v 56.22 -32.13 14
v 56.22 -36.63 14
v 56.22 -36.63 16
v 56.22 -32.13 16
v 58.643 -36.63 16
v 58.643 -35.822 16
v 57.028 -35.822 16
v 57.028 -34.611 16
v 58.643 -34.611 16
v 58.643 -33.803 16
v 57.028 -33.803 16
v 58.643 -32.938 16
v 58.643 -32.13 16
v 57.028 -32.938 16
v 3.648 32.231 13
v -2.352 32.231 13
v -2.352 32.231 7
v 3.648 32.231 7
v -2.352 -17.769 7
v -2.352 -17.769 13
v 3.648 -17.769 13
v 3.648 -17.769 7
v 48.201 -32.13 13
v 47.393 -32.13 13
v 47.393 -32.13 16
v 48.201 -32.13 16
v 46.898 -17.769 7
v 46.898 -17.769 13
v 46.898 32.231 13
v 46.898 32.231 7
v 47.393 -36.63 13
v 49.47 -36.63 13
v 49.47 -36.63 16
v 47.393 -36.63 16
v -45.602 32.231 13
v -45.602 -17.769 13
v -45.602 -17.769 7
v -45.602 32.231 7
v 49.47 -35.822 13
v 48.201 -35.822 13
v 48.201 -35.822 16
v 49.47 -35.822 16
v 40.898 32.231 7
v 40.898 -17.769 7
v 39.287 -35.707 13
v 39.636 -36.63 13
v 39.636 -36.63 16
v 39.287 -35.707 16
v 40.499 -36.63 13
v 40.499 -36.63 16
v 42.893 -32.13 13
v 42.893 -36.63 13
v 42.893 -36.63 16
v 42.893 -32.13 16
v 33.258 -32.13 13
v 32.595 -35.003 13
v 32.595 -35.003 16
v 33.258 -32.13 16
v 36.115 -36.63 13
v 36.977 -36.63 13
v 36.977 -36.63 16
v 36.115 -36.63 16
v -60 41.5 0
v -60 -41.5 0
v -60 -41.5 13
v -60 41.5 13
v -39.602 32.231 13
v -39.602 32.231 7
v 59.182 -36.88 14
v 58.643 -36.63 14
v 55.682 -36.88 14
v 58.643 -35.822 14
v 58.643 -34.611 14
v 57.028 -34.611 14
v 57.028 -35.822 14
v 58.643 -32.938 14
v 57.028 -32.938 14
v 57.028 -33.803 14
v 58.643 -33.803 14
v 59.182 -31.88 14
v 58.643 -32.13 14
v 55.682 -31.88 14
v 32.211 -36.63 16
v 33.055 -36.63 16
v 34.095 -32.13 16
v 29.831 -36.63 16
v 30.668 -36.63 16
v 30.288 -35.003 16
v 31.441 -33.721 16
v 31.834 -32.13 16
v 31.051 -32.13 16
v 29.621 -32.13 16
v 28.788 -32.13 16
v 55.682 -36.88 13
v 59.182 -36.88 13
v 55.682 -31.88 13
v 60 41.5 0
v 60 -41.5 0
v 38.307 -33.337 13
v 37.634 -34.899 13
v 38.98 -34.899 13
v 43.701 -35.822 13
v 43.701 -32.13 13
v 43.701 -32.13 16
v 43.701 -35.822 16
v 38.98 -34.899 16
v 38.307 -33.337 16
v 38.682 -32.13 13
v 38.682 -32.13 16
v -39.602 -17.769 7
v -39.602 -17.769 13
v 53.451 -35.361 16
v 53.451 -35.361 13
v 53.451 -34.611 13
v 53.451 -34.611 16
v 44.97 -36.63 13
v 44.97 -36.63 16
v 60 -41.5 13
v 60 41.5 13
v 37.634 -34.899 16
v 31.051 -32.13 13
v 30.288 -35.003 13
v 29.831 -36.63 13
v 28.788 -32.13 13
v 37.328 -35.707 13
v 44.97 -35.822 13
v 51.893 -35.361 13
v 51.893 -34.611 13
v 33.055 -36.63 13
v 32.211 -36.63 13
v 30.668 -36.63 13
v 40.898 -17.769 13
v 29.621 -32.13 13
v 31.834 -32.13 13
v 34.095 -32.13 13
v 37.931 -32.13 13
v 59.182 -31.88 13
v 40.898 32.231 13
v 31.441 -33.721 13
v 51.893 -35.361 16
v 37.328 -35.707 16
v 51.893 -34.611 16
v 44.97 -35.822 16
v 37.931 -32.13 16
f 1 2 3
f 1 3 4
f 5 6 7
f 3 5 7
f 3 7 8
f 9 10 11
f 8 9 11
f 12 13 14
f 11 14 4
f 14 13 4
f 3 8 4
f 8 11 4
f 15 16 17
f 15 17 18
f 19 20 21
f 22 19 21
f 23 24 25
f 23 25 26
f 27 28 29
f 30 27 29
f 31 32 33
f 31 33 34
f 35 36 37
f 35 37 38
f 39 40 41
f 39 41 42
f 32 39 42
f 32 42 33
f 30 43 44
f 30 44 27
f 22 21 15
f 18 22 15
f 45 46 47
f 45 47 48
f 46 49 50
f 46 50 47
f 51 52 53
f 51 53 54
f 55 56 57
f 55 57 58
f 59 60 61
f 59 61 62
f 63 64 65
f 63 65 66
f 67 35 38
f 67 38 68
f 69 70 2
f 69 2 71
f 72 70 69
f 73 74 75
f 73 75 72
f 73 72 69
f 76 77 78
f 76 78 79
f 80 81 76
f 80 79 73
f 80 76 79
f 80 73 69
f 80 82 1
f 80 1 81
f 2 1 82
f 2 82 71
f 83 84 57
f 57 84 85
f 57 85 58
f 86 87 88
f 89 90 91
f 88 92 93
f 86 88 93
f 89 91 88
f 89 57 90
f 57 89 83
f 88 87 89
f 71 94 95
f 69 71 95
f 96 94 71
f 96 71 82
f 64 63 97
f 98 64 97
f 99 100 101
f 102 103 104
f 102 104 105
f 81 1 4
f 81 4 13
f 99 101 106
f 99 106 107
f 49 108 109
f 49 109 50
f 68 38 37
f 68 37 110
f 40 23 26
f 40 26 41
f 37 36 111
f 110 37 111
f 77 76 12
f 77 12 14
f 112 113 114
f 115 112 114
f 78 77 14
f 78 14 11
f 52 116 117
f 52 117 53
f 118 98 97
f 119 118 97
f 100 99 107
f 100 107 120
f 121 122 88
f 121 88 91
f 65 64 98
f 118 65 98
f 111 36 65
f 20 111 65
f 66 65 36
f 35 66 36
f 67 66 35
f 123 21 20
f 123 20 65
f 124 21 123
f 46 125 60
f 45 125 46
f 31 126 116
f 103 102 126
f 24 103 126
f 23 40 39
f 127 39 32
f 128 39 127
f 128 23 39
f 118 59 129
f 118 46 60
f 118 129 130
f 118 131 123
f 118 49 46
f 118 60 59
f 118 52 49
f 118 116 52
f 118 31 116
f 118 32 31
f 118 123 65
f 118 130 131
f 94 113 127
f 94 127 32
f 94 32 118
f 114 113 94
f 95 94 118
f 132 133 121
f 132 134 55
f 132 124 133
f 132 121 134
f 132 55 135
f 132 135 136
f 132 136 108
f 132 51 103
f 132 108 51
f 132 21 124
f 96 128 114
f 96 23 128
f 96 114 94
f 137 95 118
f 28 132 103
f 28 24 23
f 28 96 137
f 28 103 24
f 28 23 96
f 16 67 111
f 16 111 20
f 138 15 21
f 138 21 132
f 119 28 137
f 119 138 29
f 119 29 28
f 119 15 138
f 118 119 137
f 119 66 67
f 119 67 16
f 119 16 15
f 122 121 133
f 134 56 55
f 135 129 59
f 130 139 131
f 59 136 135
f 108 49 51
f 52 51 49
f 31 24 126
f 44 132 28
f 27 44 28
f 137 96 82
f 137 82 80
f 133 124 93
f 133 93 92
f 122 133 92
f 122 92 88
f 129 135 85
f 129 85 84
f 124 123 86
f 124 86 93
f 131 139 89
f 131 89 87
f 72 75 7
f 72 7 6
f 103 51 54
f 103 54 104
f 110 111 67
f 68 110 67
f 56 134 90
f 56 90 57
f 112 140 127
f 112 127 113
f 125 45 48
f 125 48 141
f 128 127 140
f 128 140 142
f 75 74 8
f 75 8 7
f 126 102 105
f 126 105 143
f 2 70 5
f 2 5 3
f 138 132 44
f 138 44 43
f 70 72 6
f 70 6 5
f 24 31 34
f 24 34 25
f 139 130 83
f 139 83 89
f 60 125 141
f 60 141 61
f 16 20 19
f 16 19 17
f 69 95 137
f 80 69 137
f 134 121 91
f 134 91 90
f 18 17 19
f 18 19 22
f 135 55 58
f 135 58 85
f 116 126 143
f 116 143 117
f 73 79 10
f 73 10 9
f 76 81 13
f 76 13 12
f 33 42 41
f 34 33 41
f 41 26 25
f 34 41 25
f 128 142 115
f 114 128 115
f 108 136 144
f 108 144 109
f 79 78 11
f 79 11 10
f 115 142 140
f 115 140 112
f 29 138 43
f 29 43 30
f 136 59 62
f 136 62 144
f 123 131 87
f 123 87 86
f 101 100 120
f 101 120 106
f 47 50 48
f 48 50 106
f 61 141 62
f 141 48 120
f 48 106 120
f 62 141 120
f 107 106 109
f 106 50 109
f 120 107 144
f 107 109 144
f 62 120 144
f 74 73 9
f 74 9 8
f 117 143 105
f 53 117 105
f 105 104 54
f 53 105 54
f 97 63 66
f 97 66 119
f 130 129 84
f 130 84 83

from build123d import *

# Parameters (mm, degrees)
SKETCH1_W           = 120
SKETCH1_H           = 83
BOSS_EXTRUDE1_DEPTH = 13
SKETCH2_W           = 6
SKETCH2_H           = 50
CUT_EXTRUDE1_DEPTH  = 6
SKETCH4_W           = 1.557692307
SKETCH4_H           = 0.75
BOSS_EXTRUDE3_DEPTH = 3
SKETCH5_W           = 3.5
SKETCH5_H           = 5
BOSS_EXTRUDE4_DEPTH = 1


with BuildPart() as part:
    # Sketch1 → Boss-Extrude1 (new body)
    with BuildSketch(Plane.XY):
        Rectangle(SKETCH1_W, SKETCH1_H)
    extrude(amount=BOSS_EXTRUDE1_DEPTH)

    # Sketch2 → Cut-Extrude1 (cut)
    with BuildSketch(Plane.XY.offset(13)):
        with Locations((-42.602242675, 7.231357776)):
            Rectangle(SKETCH2_W, SKETCH2_H)
        with Locations((0.647757325, 7.231357776)):
            Rectangle(SKETCH2_W, SKETCH2_H)
        with Locations((43.897757325, 7.231357776)):
            Rectangle(SKETCH2_W, SKETCH2_H)
    extrude(amount=-CUT_EXTRUDE1_DEPTH, mode=Mode.SUBTRACT)

    # Sketch4 → Boss-Extrude3 (add)
    # profile 1 of 6: a face of its own
    with BuildSketch(Plane.XY.offset(13)):
        Polygon((28.787603371, -32.130057538), (29.621437506, -32.130057538), (30.287603371, -35.002954173), (31.051125006, -32.130057538), (31.834478371, -32.130057538), (32.595295679, -35.002954173), (33.257855775, -32.130057538), (34.095295679, -32.130057538), (33.055031256, -36.630057538), (32.211281256, -36.630057538), (31.441449525, -33.721103211), (30.668012025, -36.630057538), (29.830572121, -36.630057538), align=None)
    # profile 2 of 6: a face of its own
    with BuildSketch(Plane.XY.offset(13)):
        Polygon((37.930932698, -32.130057538), (38.68183414, -32.130057538), (40.499141833, -36.630057538), (39.636461544, -36.630057538), (39.286701929, -35.706980615), (37.327867794, -35.706980615), (36.977206736, -36.630057538), (36.114526448, -36.630057538), align=None)
        Polygon((38.30683414, -33.337088788), (37.634358179, -34.899288307), (38.980211544, -34.899288307), align=None, mode=Mode.SUBTRACT)
    # profile 3 of 6: a face of its own
    with BuildSketch(Plane.XY.offset(13)):
        Polygon((42.893372602, -32.130057538), (43.701064909, -32.130057538), (43.701064909, -35.82236523), (44.970295679, -35.82236523), (44.970295679, -36.630057538), (42.893372602, -36.630057538), align=None)
    # profile 4 of 6: a face of its own
    with BuildSketch(Plane.XY.offset(13)):
        Polygon((47.393372602, -32.130057538), (48.201064909, -32.130057538), (48.201064909, -35.82236523), (49.470295679, -35.82236523), (49.470295679, -36.630057538), (47.393372602, -36.630057538), align=None)
    # profile 5 of 6: a face of its own
    with BuildSketch(Plane.XY.offset(13)):
        with Locations((52.672218756, -34.985826769)):
            Rectangle(SKETCH4_W, SKETCH4_H)
    # profile 6 of 6: a face of its own
    with BuildSketch(Plane.XY.offset(13)):
        Polygon((56.220295679, -32.130057538), (58.643372602, -32.130057538), (58.643372602, -32.937749846), (57.027987986, -32.937749846), (57.027987986, -33.803134461), (58.643372602, -33.803134461), (58.643372602, -34.610826769), (57.027987986, -34.610826769), (57.027987986, -35.82236523), (58.643372602, -35.82236523), (58.643372602, -36.630057538), (56.220295679, -36.630057538), align=None)
    extrude(amount=BOSS_EXTRUDE3_DEPTH)

    # Sketch5 → Boss-Extrude4 (add)
    with BuildSketch(Plane.XY.offset(13)):
        with Locations((57.43183414, -34.380057538)):
            Rectangle(SKETCH5_W, SKETCH5_H)
    extrude(amount=BOSS_EXTRUDE4_DEPTH)


solid = part.part
